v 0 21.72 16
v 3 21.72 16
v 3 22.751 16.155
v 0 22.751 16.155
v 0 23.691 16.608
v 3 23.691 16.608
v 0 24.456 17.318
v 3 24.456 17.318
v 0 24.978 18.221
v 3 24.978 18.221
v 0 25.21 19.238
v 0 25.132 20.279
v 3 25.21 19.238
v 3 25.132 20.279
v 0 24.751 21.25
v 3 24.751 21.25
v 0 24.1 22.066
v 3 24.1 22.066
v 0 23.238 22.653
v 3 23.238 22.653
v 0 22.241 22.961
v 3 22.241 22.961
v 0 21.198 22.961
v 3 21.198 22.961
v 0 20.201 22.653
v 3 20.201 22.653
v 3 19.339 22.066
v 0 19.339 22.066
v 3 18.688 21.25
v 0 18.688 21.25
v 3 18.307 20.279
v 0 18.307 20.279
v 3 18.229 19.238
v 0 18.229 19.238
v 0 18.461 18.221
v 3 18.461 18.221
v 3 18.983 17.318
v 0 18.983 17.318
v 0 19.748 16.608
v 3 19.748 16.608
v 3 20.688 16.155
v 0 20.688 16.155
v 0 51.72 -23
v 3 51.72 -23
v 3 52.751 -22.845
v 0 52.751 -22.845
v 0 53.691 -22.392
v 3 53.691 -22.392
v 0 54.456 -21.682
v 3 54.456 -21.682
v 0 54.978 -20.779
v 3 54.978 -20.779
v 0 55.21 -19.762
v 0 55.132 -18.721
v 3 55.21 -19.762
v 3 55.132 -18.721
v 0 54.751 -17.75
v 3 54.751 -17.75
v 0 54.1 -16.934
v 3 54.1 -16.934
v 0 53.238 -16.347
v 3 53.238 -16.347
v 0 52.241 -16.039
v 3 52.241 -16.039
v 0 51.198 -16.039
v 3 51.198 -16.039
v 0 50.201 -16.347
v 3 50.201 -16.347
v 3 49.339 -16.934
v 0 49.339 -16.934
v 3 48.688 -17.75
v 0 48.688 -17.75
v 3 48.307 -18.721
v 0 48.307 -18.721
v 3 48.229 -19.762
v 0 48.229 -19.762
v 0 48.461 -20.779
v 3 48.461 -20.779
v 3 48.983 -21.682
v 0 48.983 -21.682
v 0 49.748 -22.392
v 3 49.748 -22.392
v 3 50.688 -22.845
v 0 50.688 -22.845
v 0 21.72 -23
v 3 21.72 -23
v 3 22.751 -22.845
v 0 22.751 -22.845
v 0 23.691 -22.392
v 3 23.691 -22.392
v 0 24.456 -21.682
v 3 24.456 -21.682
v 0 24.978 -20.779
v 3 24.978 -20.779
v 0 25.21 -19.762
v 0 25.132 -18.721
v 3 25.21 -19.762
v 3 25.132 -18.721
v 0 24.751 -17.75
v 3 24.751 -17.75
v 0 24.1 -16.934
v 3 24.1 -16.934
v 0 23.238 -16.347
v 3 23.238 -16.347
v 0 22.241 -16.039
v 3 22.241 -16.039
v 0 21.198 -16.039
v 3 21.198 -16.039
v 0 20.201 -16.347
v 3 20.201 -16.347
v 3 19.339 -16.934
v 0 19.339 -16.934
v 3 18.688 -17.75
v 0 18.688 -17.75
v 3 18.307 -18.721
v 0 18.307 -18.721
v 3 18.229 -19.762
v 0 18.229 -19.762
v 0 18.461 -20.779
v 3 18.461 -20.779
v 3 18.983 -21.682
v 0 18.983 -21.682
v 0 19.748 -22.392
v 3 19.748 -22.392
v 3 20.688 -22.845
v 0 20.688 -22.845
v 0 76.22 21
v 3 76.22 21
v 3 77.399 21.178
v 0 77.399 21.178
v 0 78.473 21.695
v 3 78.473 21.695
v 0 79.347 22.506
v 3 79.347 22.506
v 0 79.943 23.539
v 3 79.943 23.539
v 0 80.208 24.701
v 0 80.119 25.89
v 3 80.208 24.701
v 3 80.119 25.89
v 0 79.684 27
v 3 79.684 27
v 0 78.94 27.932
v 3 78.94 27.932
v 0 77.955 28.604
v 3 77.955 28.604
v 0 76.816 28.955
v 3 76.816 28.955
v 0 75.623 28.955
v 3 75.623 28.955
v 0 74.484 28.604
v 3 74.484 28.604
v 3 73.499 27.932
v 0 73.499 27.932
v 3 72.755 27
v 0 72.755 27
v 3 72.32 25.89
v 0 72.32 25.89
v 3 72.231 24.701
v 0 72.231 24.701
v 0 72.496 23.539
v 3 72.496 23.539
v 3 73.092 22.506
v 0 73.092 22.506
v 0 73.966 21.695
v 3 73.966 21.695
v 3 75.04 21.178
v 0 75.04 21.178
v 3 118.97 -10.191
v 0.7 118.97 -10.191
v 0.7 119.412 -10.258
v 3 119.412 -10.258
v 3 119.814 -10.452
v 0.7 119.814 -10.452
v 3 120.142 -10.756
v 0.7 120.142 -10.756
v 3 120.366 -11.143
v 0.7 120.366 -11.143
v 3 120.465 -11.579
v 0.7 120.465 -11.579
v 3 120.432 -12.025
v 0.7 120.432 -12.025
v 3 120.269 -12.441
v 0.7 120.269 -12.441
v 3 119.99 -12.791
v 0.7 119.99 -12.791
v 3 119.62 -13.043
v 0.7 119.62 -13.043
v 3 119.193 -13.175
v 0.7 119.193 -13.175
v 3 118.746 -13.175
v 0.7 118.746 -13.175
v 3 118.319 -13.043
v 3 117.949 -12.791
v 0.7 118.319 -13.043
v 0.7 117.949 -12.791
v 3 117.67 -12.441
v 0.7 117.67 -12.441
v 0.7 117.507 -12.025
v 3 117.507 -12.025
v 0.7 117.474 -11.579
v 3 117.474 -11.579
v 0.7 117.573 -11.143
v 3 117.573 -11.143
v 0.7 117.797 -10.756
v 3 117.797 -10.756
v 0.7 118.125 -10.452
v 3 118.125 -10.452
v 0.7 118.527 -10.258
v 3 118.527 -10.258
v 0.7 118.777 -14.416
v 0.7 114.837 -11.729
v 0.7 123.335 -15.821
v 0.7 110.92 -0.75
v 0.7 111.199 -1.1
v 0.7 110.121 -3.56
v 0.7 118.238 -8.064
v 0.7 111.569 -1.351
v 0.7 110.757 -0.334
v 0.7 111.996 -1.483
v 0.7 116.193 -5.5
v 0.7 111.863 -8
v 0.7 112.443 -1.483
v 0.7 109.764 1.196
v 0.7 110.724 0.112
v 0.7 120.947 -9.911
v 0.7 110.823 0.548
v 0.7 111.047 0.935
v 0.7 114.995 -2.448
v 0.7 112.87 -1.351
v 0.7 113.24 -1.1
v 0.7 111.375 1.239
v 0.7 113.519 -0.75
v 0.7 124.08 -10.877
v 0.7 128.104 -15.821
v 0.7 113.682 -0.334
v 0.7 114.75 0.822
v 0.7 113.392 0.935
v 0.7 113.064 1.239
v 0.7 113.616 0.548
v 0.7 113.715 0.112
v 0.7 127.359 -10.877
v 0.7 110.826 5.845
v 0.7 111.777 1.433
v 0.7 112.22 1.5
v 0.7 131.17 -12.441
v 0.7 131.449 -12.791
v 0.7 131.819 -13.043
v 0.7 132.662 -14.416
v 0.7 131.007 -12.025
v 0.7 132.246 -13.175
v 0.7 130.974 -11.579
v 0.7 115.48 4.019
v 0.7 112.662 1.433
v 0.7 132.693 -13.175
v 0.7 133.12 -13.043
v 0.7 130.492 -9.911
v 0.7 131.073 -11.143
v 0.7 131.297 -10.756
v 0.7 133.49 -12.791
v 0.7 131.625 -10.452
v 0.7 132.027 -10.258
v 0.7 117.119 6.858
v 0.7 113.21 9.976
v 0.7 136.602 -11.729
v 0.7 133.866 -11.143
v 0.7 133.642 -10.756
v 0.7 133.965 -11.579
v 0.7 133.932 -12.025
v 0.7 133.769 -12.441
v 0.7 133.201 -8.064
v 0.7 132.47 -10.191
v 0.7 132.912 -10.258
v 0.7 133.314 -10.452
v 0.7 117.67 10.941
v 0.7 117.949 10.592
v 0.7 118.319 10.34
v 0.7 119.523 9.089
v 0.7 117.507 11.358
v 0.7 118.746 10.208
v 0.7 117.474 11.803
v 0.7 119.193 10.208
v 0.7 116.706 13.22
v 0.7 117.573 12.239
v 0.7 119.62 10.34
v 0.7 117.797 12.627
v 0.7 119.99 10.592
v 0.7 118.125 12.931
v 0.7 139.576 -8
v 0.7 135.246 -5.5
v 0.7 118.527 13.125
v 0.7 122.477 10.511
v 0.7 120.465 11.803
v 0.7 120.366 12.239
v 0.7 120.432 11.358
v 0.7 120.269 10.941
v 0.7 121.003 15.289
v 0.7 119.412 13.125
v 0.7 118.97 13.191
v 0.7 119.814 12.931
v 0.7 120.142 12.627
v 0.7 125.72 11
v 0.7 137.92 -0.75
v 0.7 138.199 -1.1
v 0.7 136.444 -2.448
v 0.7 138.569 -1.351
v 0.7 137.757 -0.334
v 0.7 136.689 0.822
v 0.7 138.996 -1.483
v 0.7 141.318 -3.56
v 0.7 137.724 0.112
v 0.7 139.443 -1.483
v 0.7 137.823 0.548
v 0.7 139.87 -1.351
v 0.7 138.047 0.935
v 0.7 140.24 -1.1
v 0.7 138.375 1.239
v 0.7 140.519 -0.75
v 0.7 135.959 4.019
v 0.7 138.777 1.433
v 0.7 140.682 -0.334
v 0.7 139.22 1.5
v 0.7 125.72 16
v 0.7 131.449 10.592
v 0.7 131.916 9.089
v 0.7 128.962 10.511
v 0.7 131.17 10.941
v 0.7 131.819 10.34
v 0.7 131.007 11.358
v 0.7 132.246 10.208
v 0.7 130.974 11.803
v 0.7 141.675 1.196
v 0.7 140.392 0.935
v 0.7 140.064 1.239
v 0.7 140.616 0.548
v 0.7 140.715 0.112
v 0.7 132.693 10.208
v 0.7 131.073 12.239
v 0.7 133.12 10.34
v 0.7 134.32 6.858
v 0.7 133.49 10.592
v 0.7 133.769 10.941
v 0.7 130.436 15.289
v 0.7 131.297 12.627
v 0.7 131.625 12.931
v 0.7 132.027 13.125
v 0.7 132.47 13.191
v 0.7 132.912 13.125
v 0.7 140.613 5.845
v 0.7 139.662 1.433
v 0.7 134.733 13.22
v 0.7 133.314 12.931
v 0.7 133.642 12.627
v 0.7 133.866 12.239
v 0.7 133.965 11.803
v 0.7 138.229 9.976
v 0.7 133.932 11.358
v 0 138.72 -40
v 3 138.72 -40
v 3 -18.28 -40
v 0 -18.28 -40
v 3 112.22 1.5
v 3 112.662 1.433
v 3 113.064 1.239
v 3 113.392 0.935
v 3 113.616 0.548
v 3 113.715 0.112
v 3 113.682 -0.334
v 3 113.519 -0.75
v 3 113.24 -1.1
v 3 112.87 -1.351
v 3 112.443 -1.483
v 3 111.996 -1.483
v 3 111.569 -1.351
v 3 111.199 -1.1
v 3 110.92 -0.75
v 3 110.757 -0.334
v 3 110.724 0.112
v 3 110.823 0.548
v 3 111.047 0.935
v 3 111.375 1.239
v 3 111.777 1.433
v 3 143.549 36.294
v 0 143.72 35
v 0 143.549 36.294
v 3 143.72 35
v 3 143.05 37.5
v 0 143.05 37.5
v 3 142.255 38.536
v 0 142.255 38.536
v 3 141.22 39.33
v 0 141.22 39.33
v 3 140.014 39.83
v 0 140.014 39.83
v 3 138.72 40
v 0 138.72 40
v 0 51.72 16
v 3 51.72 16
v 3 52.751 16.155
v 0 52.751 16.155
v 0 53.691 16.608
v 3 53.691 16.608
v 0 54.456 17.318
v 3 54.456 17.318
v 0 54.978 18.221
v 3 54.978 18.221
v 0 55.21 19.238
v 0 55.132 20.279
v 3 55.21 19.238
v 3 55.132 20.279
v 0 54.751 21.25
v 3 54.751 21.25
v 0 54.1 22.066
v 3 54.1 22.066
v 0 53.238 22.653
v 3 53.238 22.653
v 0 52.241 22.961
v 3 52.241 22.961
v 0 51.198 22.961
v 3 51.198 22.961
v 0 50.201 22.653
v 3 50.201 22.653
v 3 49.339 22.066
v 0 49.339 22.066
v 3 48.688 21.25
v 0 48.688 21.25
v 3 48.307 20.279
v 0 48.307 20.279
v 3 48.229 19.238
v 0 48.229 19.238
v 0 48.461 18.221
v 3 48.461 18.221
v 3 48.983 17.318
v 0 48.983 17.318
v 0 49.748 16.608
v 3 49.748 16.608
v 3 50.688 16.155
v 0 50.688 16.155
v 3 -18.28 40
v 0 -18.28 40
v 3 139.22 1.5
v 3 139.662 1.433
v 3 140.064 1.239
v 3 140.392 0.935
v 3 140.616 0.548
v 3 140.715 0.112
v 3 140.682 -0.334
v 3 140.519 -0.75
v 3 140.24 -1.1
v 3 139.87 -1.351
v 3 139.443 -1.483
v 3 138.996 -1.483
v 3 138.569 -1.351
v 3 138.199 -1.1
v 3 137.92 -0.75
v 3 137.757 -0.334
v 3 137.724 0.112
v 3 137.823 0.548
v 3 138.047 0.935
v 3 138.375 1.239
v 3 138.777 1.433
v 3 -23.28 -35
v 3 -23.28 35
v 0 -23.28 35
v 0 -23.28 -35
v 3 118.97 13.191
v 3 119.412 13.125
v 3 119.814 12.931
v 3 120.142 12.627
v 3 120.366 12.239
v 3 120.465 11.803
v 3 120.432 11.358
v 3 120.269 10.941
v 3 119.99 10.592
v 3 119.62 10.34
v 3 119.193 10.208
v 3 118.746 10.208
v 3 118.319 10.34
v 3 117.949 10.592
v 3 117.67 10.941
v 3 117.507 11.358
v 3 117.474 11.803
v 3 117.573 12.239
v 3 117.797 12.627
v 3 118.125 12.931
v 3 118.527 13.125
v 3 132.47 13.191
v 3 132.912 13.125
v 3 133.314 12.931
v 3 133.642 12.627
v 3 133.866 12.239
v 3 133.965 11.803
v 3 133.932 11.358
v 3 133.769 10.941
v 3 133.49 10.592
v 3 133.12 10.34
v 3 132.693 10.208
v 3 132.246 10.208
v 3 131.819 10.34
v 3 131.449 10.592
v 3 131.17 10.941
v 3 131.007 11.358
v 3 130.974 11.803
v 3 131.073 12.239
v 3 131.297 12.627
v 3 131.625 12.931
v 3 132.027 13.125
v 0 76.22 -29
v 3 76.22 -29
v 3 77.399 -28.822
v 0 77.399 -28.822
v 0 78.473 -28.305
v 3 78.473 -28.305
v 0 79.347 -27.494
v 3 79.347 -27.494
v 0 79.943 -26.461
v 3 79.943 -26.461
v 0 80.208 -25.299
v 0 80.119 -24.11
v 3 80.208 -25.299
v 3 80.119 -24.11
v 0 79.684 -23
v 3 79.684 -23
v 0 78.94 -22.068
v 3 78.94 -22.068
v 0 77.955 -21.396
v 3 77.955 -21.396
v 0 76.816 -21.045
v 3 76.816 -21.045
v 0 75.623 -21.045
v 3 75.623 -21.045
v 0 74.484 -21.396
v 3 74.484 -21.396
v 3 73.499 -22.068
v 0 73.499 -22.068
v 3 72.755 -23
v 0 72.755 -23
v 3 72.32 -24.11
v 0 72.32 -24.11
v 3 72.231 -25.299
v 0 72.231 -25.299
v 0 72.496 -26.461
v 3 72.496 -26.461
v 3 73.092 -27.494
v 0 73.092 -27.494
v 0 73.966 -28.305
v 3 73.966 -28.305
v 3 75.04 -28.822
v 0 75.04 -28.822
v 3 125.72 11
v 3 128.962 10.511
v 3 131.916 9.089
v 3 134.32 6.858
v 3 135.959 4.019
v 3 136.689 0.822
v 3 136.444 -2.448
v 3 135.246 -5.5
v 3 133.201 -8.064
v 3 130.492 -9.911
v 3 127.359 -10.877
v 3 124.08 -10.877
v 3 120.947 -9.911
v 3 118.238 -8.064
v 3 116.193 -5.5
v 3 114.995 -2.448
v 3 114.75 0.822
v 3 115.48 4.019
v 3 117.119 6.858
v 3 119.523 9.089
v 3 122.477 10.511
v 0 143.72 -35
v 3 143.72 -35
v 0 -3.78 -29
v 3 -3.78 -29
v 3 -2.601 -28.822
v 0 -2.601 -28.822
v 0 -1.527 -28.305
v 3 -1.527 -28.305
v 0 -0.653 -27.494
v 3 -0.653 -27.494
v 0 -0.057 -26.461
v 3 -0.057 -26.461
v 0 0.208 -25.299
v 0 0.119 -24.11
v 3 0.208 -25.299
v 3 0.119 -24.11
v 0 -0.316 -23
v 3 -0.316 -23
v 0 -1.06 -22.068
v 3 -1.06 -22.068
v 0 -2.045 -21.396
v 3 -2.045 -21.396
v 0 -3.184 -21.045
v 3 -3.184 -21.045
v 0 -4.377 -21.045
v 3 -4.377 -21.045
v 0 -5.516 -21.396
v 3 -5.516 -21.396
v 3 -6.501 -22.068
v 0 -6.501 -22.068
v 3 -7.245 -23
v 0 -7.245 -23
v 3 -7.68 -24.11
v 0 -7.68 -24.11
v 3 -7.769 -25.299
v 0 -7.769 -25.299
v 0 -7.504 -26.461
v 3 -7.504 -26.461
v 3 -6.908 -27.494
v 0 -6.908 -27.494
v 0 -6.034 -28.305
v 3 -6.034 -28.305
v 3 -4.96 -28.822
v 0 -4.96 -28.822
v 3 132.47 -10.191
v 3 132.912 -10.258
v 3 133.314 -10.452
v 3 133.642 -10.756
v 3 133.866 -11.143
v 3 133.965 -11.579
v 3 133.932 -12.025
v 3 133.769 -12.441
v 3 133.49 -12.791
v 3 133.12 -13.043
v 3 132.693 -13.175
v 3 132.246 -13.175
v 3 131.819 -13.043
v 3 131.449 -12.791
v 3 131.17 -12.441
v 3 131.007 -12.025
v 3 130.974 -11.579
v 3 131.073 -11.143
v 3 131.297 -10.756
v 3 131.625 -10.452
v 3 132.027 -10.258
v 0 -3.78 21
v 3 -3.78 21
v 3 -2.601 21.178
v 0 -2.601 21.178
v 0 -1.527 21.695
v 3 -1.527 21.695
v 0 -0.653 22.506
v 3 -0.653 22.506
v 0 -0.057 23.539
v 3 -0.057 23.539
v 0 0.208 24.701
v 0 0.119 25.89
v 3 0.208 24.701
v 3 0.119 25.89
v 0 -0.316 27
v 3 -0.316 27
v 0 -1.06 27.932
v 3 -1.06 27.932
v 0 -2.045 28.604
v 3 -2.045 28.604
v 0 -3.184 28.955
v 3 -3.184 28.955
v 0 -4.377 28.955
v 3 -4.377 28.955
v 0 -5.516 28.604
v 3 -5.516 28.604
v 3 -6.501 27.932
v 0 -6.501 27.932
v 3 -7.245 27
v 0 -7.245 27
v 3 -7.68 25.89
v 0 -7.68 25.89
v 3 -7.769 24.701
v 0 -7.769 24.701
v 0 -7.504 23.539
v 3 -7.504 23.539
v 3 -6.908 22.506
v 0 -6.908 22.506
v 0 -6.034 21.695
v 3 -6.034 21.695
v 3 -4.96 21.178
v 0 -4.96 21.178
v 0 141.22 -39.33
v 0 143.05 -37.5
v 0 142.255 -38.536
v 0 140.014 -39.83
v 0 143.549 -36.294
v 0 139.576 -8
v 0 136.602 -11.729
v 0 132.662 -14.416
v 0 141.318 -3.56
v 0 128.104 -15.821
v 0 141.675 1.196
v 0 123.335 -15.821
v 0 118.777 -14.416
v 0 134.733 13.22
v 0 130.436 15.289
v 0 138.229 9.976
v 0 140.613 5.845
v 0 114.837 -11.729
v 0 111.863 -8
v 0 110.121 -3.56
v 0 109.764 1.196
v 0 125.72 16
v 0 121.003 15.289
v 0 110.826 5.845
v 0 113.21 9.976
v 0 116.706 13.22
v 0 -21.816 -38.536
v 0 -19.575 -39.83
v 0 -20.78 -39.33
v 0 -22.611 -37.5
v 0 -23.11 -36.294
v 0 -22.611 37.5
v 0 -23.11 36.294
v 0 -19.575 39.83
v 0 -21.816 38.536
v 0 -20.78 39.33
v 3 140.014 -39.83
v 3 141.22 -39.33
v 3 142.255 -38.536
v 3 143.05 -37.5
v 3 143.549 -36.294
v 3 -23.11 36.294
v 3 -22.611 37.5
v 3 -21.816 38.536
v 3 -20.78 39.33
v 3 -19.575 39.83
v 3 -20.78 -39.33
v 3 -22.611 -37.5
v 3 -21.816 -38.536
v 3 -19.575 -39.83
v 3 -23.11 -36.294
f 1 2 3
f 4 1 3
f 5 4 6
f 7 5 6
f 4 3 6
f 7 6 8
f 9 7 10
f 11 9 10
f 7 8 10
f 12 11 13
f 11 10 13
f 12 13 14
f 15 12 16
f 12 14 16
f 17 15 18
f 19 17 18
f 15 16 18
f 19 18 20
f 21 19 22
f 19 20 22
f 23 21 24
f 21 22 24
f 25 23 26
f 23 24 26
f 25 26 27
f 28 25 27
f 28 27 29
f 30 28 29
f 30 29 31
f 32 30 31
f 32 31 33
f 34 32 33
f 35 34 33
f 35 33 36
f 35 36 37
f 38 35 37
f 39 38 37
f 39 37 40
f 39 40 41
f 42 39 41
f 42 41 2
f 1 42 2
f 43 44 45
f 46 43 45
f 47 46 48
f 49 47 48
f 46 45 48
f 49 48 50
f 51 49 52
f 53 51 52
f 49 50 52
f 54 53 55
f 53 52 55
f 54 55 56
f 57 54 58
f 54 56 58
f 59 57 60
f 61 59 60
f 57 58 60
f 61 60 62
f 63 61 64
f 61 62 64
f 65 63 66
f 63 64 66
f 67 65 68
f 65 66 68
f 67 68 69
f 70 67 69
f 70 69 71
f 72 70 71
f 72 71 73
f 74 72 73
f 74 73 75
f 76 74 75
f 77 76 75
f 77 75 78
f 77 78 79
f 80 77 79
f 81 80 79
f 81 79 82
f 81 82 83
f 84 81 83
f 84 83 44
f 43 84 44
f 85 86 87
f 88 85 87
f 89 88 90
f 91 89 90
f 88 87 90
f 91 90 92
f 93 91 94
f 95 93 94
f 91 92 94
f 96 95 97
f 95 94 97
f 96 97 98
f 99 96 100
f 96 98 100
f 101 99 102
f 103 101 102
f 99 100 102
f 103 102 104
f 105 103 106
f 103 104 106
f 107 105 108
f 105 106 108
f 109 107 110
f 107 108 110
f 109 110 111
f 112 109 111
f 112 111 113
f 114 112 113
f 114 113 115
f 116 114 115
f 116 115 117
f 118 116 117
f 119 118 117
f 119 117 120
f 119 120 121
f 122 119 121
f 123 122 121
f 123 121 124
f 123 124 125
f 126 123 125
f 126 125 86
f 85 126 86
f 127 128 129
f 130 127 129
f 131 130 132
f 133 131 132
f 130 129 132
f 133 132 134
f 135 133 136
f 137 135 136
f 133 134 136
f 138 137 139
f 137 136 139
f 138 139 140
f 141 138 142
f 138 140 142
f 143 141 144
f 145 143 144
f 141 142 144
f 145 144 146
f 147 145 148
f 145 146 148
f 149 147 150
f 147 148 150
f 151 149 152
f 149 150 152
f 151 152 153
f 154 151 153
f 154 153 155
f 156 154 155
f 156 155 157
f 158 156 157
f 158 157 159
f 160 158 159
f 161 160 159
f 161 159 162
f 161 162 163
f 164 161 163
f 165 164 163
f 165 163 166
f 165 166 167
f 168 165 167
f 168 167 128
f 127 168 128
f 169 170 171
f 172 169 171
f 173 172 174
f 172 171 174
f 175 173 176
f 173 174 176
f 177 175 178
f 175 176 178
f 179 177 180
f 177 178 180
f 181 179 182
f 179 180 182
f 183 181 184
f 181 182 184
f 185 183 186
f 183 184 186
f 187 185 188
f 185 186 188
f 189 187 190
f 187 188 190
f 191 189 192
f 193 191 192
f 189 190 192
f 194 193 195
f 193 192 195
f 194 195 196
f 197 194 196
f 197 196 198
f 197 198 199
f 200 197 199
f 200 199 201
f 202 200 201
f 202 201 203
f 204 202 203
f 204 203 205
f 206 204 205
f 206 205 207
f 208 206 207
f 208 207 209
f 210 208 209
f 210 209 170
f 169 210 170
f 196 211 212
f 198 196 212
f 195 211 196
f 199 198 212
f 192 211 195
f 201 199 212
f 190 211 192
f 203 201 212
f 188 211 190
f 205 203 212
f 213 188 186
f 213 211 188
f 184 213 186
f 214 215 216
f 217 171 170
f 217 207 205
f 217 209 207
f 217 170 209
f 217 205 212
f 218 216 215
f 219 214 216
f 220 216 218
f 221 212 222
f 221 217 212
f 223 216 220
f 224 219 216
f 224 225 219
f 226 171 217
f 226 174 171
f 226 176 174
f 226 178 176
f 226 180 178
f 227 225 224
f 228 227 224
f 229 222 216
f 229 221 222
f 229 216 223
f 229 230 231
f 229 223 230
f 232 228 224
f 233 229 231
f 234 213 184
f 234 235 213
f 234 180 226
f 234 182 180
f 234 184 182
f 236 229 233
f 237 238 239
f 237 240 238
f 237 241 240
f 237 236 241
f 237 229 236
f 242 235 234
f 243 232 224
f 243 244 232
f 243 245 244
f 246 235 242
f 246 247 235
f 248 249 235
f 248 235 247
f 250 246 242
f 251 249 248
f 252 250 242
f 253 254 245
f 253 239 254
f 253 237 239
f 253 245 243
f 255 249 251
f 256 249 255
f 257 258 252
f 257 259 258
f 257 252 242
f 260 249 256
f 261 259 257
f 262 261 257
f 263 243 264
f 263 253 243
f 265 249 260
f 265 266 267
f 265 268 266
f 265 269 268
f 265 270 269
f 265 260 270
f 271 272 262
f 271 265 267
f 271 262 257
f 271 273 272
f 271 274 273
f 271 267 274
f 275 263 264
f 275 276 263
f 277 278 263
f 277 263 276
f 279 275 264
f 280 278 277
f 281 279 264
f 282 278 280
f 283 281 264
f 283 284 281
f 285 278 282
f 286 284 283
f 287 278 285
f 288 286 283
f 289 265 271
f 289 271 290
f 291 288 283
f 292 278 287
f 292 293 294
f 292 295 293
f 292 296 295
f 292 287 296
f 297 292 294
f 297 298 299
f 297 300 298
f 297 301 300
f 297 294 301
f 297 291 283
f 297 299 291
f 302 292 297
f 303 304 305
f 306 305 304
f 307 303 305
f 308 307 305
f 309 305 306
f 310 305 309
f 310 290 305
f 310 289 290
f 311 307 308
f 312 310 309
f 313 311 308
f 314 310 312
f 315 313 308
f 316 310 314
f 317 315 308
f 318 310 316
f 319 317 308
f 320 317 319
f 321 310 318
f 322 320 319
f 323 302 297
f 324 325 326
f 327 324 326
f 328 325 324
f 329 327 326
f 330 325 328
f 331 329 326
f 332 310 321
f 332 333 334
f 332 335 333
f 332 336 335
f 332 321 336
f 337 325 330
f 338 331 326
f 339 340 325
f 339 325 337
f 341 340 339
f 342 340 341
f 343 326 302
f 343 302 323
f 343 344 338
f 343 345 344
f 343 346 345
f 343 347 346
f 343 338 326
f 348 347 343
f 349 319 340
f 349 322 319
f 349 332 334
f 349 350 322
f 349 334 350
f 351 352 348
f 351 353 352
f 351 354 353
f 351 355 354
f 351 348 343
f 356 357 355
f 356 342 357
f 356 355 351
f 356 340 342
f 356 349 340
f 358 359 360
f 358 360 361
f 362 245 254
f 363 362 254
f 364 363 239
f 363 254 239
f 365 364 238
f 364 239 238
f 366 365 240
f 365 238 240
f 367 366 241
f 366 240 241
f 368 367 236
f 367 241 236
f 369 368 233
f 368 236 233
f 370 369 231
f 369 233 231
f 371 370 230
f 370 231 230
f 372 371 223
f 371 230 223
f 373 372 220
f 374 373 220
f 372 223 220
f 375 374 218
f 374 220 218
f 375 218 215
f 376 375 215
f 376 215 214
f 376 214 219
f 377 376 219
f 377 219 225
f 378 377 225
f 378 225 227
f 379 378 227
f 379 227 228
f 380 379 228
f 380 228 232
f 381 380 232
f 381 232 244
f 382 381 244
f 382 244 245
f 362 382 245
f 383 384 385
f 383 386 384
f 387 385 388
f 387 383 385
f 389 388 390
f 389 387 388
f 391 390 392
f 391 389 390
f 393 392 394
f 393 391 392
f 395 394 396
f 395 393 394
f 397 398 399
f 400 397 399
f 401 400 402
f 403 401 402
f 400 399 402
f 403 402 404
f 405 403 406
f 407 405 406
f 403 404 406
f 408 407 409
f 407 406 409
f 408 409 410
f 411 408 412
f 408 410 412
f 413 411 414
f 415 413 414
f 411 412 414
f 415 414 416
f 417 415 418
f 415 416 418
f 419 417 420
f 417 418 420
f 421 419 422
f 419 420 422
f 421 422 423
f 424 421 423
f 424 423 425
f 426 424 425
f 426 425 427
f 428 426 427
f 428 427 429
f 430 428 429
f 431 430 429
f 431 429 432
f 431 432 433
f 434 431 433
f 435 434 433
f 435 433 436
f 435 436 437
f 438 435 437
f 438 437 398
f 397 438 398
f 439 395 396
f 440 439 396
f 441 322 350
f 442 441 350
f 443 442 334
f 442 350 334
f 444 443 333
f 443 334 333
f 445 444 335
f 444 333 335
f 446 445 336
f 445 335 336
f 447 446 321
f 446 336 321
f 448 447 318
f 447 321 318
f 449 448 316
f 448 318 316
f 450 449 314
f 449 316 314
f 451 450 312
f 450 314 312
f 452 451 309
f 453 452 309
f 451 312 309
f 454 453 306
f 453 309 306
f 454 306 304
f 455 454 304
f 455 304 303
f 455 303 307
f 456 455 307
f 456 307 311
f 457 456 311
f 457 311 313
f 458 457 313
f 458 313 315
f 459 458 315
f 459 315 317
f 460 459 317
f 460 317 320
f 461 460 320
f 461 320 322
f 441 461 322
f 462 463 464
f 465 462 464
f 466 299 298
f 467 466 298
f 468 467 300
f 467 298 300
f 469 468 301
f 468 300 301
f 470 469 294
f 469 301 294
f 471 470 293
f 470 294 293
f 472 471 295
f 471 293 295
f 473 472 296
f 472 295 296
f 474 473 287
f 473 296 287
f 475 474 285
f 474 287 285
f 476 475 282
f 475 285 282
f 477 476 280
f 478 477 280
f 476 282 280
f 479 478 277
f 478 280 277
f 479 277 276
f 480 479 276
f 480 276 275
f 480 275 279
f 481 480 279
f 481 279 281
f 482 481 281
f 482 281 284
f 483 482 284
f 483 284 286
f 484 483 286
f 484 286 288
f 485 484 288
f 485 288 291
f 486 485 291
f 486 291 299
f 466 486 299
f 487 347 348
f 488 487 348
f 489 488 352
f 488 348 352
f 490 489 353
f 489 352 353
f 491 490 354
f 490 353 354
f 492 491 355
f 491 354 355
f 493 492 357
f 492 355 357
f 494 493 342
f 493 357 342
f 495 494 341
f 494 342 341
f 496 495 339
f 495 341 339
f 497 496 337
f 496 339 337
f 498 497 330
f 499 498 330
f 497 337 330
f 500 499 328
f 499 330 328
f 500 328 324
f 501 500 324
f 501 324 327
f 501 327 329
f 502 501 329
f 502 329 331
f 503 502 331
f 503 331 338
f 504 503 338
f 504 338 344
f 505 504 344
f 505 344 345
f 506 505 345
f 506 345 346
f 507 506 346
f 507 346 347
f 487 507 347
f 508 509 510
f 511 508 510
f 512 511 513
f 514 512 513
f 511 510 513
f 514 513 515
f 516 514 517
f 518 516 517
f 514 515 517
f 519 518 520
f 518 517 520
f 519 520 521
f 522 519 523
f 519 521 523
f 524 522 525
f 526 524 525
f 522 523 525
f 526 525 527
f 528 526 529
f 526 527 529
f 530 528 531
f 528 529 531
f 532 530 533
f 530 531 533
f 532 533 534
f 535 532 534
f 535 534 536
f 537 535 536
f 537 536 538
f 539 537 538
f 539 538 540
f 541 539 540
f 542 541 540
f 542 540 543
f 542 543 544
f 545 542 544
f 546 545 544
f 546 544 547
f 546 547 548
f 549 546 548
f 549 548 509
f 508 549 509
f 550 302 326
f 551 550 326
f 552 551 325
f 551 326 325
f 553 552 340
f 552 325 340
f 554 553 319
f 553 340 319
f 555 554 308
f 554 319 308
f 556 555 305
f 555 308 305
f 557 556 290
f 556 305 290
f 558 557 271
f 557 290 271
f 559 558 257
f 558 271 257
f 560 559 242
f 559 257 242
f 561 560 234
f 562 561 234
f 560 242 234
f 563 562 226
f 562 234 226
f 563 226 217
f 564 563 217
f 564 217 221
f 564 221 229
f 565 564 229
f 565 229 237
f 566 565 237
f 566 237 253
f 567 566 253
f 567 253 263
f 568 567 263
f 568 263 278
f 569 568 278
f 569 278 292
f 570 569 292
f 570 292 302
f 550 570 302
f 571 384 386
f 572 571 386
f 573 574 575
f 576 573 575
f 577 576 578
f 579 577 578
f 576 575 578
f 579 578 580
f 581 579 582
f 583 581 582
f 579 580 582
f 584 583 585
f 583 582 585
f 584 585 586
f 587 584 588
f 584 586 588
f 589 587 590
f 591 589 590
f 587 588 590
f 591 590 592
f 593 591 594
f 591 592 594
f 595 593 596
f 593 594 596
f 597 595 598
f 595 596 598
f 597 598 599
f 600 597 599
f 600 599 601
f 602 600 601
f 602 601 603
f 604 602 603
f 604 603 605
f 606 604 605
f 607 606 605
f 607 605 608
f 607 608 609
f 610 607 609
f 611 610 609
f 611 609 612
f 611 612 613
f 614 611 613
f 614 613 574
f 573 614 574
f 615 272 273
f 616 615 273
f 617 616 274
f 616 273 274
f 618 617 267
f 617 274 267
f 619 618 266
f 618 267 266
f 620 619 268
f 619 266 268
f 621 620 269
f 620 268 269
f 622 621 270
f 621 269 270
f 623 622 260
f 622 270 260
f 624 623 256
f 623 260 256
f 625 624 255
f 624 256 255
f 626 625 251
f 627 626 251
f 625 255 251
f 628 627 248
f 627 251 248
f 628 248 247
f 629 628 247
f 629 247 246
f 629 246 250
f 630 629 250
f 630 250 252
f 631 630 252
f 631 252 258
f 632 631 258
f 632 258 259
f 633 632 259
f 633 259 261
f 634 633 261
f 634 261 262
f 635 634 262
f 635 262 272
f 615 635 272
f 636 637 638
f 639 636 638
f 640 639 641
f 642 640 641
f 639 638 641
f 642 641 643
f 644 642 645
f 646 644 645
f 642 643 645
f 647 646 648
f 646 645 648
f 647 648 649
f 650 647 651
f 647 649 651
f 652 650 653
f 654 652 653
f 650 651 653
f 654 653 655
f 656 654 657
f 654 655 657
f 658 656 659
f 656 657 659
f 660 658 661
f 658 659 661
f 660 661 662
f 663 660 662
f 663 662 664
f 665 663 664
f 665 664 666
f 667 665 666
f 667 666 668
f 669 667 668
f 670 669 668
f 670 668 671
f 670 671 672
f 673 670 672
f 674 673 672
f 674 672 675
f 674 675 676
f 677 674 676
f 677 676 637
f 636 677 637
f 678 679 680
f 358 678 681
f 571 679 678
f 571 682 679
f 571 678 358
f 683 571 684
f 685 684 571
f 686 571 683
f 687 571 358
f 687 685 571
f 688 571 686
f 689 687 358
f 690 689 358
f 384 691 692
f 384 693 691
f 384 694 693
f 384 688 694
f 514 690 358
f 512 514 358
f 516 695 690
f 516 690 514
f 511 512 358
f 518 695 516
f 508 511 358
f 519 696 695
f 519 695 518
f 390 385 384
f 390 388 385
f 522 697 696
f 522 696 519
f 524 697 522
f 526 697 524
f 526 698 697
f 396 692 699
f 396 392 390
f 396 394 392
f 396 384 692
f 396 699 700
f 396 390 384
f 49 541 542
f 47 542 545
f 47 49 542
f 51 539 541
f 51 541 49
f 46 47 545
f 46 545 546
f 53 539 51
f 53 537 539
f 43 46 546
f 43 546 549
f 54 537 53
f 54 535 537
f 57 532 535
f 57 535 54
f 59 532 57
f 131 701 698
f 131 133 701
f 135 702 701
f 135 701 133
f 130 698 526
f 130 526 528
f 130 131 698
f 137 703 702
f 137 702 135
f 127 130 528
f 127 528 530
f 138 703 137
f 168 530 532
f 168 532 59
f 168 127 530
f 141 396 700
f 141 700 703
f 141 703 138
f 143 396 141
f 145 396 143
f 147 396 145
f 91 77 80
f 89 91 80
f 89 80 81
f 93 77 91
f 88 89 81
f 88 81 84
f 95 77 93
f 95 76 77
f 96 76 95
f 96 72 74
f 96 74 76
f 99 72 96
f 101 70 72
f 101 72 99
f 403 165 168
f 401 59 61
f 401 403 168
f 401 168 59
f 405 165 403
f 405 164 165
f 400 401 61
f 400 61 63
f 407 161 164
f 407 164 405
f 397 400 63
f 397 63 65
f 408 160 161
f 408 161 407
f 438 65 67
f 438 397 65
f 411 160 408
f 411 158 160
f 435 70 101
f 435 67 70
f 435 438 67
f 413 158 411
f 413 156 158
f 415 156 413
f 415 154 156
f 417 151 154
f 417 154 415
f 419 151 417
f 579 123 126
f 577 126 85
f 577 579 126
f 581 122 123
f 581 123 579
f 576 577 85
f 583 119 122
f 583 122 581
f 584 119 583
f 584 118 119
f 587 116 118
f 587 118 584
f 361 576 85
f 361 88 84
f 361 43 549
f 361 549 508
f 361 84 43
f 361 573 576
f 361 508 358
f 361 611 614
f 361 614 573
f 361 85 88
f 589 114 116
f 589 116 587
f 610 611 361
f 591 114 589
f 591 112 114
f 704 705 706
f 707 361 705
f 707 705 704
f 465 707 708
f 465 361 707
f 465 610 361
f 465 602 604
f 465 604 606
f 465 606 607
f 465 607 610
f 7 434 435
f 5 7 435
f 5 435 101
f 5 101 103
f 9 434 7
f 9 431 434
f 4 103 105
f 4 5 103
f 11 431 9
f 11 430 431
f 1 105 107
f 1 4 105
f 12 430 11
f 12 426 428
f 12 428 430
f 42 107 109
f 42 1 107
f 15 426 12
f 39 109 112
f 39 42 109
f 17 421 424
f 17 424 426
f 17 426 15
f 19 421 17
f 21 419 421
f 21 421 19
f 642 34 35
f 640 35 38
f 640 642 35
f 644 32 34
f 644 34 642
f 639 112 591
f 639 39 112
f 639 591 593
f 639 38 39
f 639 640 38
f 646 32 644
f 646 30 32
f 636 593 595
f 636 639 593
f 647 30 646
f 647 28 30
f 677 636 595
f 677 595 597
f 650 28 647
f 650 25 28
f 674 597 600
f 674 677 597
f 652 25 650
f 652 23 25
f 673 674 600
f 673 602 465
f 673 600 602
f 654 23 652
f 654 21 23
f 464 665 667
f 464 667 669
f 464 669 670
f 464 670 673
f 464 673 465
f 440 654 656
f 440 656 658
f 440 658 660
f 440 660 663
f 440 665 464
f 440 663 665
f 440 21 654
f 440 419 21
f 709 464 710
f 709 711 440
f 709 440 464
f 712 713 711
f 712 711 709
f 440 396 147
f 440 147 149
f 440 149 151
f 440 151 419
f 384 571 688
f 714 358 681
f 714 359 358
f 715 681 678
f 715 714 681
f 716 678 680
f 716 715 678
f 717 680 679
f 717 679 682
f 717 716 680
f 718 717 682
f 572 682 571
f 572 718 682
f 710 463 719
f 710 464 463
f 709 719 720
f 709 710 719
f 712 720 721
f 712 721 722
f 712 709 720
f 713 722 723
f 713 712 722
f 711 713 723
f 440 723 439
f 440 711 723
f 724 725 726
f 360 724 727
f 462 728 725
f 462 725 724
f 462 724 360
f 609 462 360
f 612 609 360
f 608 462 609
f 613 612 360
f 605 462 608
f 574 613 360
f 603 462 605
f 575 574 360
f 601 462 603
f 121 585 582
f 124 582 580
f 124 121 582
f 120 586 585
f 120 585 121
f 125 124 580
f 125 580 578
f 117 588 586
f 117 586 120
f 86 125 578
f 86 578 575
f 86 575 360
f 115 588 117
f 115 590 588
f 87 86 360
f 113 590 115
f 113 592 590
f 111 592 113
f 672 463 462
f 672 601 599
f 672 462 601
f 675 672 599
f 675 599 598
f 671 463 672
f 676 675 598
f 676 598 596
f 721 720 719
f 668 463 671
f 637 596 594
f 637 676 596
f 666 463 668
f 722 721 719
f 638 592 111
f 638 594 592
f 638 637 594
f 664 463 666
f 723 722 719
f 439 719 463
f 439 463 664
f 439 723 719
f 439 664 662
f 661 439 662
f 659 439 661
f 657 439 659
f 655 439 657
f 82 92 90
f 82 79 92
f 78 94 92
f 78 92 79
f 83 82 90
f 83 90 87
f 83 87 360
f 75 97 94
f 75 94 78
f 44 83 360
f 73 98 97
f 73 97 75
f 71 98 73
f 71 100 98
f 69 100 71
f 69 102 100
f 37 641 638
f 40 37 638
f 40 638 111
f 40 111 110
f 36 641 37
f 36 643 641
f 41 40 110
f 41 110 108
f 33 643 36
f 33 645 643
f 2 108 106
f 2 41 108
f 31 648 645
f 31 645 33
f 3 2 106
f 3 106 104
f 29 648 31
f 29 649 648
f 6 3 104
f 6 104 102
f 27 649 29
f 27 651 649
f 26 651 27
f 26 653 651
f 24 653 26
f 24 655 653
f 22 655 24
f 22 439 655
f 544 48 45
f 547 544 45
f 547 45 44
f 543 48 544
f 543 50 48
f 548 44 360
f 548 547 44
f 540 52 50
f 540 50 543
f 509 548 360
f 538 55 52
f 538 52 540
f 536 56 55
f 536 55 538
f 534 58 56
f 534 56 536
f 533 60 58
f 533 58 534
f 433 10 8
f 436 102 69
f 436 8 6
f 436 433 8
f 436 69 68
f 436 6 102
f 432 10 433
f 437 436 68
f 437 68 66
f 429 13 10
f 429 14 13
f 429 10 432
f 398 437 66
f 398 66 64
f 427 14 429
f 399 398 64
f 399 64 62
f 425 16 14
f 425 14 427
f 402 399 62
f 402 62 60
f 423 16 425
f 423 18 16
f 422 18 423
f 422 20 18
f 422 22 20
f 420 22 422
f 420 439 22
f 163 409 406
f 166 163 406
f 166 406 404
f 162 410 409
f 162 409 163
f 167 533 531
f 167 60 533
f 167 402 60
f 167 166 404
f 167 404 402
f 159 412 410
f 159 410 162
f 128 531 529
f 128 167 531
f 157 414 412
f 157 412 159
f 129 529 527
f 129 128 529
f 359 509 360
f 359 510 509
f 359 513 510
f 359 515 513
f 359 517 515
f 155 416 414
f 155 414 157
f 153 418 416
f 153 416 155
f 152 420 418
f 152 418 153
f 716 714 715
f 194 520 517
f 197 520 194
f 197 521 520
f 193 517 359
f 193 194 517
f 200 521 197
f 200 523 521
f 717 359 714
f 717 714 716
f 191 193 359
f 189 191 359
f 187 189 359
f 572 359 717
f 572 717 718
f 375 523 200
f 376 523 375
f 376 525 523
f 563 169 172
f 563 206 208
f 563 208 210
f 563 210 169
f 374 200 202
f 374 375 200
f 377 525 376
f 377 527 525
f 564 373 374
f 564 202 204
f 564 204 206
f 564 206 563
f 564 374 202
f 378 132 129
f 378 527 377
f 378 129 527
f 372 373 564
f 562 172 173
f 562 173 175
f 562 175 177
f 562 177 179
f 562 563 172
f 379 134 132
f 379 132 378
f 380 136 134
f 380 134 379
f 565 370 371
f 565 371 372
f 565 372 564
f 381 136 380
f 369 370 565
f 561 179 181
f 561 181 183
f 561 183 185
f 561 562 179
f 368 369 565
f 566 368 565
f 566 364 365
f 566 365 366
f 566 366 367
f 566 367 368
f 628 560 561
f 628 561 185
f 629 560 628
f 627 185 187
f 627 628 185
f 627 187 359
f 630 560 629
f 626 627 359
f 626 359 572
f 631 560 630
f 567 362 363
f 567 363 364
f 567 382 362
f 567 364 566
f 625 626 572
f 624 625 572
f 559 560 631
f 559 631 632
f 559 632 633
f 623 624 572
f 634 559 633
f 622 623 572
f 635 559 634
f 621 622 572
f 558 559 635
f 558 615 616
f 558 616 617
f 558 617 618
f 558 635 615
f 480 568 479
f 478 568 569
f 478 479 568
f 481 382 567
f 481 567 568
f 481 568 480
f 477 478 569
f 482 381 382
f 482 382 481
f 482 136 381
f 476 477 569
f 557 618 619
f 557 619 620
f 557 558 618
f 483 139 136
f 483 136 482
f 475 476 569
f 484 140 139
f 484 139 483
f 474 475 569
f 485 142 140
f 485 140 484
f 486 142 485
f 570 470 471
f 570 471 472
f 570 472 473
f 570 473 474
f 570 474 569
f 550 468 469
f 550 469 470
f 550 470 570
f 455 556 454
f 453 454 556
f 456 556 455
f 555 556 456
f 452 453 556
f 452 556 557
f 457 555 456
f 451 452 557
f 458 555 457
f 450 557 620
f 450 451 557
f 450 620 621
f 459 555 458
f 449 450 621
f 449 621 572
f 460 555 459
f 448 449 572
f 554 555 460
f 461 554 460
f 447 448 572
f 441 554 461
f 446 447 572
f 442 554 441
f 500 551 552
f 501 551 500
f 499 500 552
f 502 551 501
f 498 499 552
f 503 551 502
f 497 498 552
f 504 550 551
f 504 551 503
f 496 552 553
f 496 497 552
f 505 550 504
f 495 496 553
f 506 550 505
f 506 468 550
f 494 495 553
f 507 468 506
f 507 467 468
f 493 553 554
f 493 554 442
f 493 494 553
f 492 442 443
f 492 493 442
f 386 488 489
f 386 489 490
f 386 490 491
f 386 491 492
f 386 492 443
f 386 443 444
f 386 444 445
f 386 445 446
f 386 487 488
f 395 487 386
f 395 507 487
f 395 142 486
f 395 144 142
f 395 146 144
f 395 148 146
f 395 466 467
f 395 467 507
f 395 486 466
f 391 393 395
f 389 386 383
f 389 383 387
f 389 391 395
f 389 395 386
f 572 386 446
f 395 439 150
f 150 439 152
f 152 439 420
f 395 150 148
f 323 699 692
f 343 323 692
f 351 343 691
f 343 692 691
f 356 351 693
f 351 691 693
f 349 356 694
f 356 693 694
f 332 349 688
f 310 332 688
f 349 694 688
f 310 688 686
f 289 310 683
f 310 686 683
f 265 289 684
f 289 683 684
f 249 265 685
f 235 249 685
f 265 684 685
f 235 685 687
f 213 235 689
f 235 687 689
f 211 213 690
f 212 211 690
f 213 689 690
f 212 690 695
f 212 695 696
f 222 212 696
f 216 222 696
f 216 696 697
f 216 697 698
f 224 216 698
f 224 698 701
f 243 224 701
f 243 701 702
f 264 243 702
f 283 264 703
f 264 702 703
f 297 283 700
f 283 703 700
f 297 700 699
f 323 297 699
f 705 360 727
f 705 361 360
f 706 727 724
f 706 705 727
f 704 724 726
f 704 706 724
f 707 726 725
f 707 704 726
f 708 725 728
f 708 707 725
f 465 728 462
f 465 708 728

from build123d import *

# Parameters (mm, degrees)
BOSS_EXTRUDE1_DEPTH = 40
SKETCH16_R          = 3.5
SKETCH16_R_2        = 4
CUT_EXTRUDE5_DEPTH  = 150.212253532
SKETCH18_R          = 1.5
SKETCH18_R_2        = 11
CUT_EXTRUDE6_DEPTH  = 150.212253532
SKETCH19_R          = 16
CUT_EXTRUDE7_DEPTH  = 0.7
FILLET1_R           = 5


with BuildPart() as part:
    # Sketch1 → Boss-Extrude1 (new, symmetric)
    with BuildSketch(Plane.XY):
        Polygon((0, -23.280493307), (0, 106.719506693), (0, 143.719506693), (3, 143.719506693), (3, 103.719506693), (3, -23.280493307), align=None)
    extrude(amount=BOSS_EXTRUDE1_DEPTH, both=True)

    # Sketch16 → Cut-Extrude5 (cut, through all)
    with BuildSketch(Plane(origin=(3, 0, 0), x_dir=(0, 0, -1), z_dir=(1, 0, 0))):
        with Locations((-19.5, 21.719506693)):
            Circle(SKETCH16_R)
        with Locations((19.5, 21.719506693)):
            Circle(SKETCH16_R)
        with Locations((19.5, 51.719506693)):
            Circle(SKETCH16_R)
        with Locations((-19.5, 51.719506693)):
            Circle(SKETCH16_R)
        with Locations((25, 76.219506693)):
            Circle(SKETCH16_R_2)
        with Locations((-25, 76.219506693)):
            Circle(SKETCH16_R_2)
        with Locations((-25, -3.780493307)):
            Circle(SKETCH16_R_2)
        with Locations((25, -3.780493307)):
            Circle(SKETCH16_R_2)
    extrude(amount=-CUT_EXTRUDE5_DEPTH, mode=Mode.SUBTRACT)

    # Sketch18 → Cut-Extrude6 (cut, through all)
    with BuildSketch(Plane.ZY):
        with Locations((0, 139.219506693)):
            Circle(SKETCH18_R)
        with Locations((0, 125.719506693)):
            Circle(SKETCH18_R_2)
        with Locations((11.691342951, 132.469506693)):
            Circle(SKETCH18_R)
        with Locations((11.691342951, 118.969506693)):
            Circle(SKETCH18_R)
        with Locations((0, 112.219506693)):
            Circle(SKETCH18_R)
        with Locations((-11.691342951, 118.969506693)):
            Circle(SKETCH18_R)
        with Locations((-11.691342951, 132.469506693)):
            Circle(SKETCH18_R)
    extrude(amount=-CUT_EXTRUDE6_DEPTH, mode=Mode.SUBTRACT)

    # Sketch19 → Cut-Extrude7 (cut)
    with BuildSketch(Plane.ZY):
        with Locations((0, 125.719506693)):
            Circle(SKETCH19_R)
    extrude(amount=-CUT_EXTRUDE7_DEPTH, mode=Mode.SUBTRACT)

    # Fillet1
    fillet1_edges = [part.edges().sort_by_distance(p)[0] for p in [
        (1.5, 143.719506693, 40),
        (1.5, -23.280493307, 40),
        (1.5, 143.719506693, -40),
        (1.5, -23.280493307, -40),
    ]]
    fillet(fillet1_edges, radius=FILLET1_R)


solid = part.part
